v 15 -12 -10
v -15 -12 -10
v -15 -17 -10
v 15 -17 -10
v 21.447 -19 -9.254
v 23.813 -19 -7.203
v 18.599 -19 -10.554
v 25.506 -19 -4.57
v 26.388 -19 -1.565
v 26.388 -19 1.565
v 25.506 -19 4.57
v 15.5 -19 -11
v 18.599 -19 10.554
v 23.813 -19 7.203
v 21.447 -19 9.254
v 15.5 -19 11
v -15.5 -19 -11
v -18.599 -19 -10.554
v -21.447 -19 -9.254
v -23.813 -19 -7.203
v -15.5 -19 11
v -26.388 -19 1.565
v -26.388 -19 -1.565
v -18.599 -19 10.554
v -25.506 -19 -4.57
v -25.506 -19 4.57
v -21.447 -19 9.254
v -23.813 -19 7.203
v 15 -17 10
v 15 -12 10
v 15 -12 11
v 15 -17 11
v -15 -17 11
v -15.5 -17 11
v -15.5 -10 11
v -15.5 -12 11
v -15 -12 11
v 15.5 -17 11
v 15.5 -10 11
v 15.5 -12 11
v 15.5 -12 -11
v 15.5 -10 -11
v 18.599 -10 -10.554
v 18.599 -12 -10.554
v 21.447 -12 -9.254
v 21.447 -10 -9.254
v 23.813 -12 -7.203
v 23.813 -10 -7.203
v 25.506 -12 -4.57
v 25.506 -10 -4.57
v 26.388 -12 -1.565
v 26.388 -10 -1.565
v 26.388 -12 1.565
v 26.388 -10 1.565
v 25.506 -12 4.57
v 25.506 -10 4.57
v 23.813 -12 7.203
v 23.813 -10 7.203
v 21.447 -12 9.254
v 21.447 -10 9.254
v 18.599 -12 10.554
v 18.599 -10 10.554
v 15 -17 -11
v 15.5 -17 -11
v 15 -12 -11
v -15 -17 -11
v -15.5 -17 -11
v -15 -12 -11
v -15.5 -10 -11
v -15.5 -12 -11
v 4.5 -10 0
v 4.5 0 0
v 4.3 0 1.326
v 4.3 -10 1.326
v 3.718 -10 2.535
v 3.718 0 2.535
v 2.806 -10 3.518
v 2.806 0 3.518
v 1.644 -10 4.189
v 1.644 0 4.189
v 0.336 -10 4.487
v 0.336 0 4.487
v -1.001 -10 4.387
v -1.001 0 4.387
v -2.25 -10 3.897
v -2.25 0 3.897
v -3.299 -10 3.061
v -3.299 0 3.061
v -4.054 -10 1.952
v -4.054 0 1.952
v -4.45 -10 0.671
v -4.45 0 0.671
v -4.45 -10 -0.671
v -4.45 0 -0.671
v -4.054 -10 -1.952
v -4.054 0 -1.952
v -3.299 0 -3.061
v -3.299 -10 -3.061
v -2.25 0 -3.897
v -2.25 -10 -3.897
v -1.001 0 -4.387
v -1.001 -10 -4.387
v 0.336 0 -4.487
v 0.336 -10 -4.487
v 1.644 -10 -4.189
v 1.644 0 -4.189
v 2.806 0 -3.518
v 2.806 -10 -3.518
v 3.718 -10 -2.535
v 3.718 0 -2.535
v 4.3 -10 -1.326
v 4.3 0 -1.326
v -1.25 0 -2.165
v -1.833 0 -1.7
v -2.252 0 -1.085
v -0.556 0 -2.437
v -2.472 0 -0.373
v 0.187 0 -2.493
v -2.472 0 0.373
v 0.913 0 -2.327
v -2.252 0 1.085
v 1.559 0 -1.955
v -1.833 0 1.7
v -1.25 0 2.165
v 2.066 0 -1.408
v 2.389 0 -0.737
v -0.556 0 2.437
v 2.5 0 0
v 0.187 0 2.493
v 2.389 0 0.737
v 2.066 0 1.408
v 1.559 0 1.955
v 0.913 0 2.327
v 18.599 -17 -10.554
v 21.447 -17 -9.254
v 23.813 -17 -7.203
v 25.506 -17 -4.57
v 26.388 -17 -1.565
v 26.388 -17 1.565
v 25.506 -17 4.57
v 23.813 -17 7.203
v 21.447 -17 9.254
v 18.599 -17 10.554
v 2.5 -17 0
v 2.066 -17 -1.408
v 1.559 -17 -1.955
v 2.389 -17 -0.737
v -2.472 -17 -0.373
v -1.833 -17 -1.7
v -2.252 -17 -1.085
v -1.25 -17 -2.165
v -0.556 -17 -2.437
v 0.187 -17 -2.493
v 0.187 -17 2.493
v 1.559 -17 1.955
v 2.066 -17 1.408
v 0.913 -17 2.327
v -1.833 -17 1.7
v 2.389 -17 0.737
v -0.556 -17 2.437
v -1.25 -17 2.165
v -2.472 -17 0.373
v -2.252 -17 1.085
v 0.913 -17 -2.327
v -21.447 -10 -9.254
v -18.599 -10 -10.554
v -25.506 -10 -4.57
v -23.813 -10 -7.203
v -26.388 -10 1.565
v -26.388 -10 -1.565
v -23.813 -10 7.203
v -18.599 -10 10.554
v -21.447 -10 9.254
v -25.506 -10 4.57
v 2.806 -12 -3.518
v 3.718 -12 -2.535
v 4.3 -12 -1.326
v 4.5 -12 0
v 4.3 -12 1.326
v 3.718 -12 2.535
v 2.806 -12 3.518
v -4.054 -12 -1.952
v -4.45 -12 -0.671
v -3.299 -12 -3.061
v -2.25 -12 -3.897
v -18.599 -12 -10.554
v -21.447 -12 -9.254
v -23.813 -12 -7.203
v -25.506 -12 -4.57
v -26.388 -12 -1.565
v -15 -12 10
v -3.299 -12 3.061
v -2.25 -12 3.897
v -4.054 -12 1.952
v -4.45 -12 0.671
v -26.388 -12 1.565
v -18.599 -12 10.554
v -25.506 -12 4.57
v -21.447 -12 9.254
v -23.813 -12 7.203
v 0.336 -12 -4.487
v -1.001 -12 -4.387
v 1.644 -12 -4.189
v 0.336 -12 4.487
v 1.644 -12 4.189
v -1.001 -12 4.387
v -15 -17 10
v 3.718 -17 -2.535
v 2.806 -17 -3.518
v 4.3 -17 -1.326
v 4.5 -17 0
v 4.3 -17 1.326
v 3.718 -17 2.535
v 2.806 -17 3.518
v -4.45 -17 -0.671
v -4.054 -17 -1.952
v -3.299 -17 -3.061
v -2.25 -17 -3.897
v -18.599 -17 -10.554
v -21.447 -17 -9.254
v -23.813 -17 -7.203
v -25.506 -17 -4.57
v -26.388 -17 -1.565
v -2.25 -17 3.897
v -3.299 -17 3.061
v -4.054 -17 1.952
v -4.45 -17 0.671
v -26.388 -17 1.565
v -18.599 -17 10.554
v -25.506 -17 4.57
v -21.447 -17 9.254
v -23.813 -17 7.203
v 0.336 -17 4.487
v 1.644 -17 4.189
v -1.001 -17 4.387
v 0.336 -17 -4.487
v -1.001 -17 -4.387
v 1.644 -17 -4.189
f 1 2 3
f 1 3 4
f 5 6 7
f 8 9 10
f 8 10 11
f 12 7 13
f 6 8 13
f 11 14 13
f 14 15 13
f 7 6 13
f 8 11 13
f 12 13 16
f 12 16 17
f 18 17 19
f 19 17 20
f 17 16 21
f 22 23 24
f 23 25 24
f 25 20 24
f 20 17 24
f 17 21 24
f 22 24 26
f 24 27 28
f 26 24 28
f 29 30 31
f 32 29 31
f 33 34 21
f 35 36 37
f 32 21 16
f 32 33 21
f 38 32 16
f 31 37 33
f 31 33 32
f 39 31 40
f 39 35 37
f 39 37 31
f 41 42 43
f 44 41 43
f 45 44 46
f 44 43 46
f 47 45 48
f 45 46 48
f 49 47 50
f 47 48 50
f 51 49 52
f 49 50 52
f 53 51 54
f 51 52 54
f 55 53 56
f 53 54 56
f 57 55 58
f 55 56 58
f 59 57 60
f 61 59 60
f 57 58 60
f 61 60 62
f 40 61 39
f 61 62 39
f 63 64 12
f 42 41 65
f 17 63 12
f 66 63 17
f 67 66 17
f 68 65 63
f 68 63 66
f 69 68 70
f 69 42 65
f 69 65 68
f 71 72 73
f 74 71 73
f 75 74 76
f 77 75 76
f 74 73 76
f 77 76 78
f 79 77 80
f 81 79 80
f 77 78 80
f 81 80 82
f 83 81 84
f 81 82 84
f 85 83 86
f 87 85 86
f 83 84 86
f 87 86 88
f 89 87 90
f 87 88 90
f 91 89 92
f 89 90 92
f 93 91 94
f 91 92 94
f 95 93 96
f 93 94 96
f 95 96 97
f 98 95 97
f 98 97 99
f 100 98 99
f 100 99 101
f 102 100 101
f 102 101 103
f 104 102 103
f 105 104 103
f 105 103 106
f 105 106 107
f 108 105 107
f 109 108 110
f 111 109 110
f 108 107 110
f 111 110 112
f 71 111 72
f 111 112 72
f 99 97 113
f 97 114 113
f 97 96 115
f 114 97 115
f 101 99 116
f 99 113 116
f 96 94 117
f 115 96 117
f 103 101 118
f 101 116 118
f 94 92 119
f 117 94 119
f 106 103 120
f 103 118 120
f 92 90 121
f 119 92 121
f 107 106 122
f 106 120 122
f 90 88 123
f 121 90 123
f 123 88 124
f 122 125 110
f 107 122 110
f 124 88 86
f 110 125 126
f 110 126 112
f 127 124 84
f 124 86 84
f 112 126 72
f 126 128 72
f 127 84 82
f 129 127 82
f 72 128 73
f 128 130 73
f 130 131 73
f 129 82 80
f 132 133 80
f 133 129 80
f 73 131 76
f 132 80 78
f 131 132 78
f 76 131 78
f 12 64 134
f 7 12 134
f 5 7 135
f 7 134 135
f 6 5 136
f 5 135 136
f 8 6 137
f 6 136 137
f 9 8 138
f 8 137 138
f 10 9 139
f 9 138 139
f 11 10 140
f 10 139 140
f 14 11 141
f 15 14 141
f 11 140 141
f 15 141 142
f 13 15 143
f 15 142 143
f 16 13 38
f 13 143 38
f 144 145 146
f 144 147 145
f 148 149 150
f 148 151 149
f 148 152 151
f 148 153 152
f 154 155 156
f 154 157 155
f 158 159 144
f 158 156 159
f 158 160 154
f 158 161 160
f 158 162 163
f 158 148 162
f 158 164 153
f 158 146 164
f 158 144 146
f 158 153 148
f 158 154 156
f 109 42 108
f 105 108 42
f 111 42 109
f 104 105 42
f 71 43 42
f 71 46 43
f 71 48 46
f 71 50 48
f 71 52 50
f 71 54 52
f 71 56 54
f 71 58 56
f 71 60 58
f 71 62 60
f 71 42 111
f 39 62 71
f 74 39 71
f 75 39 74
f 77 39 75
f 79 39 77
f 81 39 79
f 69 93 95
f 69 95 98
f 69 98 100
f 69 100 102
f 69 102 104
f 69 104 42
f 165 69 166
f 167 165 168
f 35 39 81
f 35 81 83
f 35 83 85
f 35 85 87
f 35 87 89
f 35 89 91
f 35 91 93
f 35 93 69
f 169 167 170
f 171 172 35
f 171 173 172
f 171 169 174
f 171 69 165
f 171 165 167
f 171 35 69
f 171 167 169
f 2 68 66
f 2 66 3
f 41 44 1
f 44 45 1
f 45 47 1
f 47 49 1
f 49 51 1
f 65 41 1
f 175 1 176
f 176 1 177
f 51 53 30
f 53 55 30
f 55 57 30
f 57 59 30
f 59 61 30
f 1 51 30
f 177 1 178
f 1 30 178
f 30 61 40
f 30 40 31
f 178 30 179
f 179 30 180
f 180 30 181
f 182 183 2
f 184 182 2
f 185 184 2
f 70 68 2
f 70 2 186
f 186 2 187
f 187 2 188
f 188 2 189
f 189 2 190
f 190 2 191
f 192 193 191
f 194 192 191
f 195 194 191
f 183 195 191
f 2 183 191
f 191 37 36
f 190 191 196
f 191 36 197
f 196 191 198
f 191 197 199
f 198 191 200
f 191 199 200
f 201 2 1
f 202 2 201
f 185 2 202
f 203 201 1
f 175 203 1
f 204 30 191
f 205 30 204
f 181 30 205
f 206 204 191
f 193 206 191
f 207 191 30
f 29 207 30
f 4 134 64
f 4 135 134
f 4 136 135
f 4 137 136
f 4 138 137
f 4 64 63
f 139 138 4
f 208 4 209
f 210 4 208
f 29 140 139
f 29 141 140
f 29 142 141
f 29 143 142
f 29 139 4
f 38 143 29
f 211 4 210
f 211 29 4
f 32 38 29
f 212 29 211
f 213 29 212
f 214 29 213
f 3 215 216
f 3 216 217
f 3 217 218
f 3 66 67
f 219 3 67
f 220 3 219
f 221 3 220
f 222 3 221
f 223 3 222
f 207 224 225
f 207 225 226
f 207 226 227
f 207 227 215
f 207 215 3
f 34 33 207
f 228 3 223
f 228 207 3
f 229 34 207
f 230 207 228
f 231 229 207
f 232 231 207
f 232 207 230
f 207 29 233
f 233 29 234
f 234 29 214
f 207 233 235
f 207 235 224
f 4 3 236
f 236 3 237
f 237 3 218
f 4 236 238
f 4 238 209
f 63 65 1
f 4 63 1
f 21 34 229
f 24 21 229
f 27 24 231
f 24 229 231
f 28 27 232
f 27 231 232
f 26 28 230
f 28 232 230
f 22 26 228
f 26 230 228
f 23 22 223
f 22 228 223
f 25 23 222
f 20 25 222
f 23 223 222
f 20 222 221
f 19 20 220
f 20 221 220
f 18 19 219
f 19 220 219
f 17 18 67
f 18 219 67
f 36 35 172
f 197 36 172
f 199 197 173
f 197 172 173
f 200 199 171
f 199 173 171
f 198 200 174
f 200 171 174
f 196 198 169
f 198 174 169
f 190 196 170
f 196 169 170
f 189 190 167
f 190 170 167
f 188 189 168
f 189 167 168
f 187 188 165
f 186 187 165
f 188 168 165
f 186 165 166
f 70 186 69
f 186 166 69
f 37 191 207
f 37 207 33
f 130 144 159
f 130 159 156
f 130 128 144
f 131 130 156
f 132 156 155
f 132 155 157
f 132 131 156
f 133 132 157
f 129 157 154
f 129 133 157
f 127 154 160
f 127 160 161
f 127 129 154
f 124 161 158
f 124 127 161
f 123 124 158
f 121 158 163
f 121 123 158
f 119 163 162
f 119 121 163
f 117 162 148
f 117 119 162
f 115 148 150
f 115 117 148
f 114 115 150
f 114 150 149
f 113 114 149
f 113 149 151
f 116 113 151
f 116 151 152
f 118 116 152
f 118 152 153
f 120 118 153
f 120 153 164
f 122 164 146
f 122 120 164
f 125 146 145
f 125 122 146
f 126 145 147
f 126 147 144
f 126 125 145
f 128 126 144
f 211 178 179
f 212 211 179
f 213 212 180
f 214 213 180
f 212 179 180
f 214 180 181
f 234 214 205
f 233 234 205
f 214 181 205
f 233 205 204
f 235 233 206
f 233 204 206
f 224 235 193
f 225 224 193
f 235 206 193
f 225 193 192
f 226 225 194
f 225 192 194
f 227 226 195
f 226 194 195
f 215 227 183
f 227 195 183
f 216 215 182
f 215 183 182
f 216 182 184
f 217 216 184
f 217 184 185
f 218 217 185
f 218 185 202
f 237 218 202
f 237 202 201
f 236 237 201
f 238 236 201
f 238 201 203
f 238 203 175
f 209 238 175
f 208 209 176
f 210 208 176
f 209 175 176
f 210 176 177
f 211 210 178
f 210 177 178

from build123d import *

# Parameters (mm, degrees)
SKETCH_R      = 4.5
SKETCH_R_2    = 2.5
PAD_DEPTH     = 10
SKETCH001_R   = 2.5
PAD001_DEPTH  = 2
SKETCH002_R   = 4.5
SKETCH002_R_2 = 2.5
SKETCH002_W   = 30
SKETCH002_H   = 1
PAD002_DEPTH  = 5
PAD003_DEPTH  = 2


with BuildPart() as part:
    # Sketch → Pad (new body)
    with BuildSketch(Plane.XZ):
        Circle(SKETCH_R)
        Circle(SKETCH_R_2, mode=Mode.SUBTRACT)
    extrude(amount=PAD_DEPTH)

    # Sketch001 → Pad001 (new body)
    with BuildSketch(Plane.XZ.offset(10)):
        with BuildLine():
            Line((15.499965, -11), (-15.499965, -11))
            ThreePointArc((-15.499965, 11), (-26.5, 0), (-15.499965, -11))
            Line((-15.499965, 11), (15.499965, 11))
            ThreePointArc((15.499965, -11), (26.5, 0), (15.499965, 11))
        make_face()
        Circle(SKETCH001_R, mode=Mode.SUBTRACT)
    extrude(amount=PAD001_DEPTH)

    # Sketch002 → Pad002 (new body)
    with BuildSketch(Plane.XZ.offset(12)):
        Circle(SKETCH002_R)
        Circle(SKETCH002_R_2, mode=Mode.SUBTRACT)
        with Locations((0, 10.5)):
            Rectangle(SKETCH002_W, SKETCH002_H)
        with Locations((0, -10.5)):
            Rectangle(SKETCH002_W, SKETCH002_H)
    extrude(amount=PAD002_DEPTH)

    # Sketch003 → Pad003 (new body)
    with BuildSketch(Plane.XZ.offset(17)):
        with BuildLine():
            Line((-15.5, 11), (15.5, 11))
            ThreePointArc((15.499965, -11), (26.499965, -1.7e-05), (15.5, 11))
            Line((15.499965, -11), (-15.499963, -11))
            ThreePointArc((-15.5, 11), (-26.499965, -1.8e-05), (-15.499963, -11))
        make_face()
    extrude(amount=PAD003_DEPTH)


solid = part.part
